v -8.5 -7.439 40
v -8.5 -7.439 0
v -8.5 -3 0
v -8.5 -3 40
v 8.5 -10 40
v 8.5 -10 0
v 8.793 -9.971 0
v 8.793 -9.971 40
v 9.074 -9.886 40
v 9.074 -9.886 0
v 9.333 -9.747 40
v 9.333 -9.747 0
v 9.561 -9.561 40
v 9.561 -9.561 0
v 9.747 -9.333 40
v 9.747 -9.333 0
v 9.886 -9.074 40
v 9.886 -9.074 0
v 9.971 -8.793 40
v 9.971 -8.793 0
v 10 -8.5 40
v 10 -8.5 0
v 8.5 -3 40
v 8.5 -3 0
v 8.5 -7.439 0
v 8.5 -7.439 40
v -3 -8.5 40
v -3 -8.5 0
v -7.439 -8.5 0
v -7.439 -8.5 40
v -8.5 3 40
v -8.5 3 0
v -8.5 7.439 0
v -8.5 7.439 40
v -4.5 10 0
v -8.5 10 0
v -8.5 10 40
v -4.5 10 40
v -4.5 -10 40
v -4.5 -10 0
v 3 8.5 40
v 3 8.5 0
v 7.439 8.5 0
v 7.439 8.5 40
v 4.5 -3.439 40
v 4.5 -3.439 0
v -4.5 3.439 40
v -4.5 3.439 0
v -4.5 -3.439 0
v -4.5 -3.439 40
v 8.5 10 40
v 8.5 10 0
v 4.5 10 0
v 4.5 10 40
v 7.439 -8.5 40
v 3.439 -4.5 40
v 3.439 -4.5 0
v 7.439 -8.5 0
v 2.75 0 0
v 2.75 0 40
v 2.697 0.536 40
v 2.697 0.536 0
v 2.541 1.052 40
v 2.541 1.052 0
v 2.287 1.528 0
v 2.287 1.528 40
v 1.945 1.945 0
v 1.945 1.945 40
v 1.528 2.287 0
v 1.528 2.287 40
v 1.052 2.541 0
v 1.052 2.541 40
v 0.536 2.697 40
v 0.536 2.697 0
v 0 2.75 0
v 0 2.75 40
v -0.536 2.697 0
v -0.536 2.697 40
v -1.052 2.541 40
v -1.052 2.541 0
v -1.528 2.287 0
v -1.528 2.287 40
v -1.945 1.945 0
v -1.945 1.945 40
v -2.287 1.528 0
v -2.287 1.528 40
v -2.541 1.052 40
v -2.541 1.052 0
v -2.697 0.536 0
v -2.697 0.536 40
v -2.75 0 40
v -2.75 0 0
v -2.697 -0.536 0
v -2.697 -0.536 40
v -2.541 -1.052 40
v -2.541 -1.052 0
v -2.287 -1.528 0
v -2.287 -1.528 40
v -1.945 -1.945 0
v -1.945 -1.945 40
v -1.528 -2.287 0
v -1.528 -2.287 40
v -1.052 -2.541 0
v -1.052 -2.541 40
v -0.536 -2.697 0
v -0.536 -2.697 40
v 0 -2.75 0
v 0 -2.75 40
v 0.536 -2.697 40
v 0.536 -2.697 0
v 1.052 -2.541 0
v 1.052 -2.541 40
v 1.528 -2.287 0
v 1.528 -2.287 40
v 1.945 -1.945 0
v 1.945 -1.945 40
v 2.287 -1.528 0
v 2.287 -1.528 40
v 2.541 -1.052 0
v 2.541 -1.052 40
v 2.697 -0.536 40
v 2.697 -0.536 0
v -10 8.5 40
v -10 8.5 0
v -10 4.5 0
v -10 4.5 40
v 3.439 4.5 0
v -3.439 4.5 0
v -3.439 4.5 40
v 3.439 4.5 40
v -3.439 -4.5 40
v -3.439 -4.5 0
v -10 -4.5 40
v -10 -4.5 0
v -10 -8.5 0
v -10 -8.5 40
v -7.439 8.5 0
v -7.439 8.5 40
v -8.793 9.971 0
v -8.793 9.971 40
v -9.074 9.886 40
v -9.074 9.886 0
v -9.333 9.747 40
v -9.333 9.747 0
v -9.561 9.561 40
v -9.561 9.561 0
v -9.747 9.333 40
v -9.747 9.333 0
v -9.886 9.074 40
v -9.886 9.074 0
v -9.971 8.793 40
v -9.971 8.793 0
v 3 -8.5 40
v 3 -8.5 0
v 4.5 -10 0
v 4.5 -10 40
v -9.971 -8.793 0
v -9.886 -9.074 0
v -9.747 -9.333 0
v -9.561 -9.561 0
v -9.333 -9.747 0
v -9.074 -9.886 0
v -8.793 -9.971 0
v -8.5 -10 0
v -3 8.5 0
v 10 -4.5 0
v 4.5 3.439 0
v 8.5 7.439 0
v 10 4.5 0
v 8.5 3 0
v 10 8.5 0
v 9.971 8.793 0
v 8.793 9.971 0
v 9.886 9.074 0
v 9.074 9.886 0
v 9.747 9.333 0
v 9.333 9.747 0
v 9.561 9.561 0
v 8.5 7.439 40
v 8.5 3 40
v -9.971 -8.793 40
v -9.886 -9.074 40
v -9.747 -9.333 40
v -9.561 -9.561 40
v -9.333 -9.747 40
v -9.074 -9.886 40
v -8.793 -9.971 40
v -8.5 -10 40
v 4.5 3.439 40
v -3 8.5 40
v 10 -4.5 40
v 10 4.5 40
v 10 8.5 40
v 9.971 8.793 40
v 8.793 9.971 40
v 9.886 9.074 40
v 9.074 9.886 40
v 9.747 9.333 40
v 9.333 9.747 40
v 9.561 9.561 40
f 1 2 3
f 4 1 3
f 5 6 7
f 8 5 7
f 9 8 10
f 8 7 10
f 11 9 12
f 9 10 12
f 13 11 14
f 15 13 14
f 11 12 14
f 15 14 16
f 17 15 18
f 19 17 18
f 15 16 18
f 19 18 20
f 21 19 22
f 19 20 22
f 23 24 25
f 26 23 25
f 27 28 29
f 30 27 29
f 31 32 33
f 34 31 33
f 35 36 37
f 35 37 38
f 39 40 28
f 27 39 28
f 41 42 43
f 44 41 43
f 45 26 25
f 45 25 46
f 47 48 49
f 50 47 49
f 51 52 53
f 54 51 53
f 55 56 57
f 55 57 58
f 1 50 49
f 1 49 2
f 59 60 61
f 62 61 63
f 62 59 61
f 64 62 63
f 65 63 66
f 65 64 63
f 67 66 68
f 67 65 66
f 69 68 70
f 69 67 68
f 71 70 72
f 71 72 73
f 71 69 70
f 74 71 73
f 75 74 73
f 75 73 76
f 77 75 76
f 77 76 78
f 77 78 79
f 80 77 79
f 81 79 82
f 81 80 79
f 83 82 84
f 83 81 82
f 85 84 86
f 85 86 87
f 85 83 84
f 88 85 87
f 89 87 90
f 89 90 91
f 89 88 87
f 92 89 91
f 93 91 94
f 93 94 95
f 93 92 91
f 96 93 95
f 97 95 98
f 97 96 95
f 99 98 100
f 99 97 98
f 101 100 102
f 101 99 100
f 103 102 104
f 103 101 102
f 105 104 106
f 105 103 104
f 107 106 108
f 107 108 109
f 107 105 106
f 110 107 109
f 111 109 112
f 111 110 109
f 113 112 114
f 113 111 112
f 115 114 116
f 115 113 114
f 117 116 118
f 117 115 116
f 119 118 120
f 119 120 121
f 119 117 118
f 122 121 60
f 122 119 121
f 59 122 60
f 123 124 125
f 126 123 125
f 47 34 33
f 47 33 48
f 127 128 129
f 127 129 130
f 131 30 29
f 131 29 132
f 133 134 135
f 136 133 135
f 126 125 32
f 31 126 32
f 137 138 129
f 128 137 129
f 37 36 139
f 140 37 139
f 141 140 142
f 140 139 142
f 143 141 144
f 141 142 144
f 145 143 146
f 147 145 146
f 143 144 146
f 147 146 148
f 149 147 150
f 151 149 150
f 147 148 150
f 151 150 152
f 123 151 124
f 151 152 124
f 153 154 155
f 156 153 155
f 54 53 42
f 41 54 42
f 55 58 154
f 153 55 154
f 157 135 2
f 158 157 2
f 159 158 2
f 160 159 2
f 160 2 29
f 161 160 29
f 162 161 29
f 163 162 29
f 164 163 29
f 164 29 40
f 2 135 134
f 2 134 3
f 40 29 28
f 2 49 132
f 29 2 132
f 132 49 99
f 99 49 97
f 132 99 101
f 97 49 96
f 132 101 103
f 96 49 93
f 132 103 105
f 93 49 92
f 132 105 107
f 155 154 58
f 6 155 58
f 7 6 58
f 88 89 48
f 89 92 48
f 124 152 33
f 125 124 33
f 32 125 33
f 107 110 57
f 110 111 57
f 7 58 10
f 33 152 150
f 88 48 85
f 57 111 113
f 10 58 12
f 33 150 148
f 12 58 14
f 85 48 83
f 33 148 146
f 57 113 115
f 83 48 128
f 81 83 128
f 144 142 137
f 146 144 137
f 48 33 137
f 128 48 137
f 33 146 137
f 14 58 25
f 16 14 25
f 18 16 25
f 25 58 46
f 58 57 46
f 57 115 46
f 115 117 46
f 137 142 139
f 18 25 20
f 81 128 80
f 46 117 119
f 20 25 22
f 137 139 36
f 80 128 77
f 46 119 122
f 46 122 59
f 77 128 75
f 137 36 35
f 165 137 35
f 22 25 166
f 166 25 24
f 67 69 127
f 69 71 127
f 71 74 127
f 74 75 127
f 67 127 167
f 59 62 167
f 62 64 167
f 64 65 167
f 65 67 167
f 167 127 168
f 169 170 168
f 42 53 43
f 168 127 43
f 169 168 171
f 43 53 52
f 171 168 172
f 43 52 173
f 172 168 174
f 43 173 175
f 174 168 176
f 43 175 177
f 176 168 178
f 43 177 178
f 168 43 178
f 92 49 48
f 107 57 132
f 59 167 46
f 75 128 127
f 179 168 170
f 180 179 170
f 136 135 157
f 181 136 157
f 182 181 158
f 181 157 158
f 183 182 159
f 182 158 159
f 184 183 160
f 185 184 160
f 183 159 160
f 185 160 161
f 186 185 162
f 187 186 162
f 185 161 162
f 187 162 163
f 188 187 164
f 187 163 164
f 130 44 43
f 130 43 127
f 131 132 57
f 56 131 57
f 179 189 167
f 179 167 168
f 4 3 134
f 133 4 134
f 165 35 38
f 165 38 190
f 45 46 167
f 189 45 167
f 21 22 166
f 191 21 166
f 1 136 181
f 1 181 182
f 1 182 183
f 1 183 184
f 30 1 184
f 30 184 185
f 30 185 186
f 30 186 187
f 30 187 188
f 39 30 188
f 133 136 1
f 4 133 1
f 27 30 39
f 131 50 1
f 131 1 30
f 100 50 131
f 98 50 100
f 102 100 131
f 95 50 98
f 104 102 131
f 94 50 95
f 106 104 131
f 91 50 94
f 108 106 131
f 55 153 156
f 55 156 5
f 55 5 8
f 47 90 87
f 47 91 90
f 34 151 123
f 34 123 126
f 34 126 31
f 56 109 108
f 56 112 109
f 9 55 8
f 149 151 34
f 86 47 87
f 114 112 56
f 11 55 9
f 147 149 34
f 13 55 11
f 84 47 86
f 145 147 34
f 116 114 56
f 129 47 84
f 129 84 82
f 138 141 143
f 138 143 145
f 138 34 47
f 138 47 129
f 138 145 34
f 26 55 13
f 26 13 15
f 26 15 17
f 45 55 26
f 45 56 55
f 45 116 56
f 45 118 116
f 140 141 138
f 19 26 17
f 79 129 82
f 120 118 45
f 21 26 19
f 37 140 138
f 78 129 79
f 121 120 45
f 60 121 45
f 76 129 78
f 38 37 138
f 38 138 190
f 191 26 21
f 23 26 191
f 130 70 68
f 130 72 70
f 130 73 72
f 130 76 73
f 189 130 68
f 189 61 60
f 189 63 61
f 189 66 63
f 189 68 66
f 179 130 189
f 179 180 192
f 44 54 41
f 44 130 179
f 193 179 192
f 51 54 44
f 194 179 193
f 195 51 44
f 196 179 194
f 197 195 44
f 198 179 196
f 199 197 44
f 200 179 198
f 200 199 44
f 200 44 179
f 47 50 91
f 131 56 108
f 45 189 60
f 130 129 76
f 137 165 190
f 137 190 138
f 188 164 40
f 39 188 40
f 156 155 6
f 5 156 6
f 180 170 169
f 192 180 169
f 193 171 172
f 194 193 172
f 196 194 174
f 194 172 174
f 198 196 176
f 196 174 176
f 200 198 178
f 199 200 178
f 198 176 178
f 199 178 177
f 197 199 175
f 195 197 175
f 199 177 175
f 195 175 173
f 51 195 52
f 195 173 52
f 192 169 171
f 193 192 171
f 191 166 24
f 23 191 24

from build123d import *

# Parameters (mm, degrees)
SKETCH_R  = 2.75
PAD_DEPTH = 40


with BuildPart() as part:
    # Sketch → Pad (new body)
    with BuildSketch(Plane.XY):
        with BuildLine():
            ThreePointArc((-8.5, 10), (-9.56066, 9.56066), (-10, 8.5))
            Line((-10, 8.5), (-10, 4.5))
            Line((-10, 4.5), (-8.5, 3))
            Line((-8.5, 3), (-8.5, 7.43934))
            Line((-8.5, 7.43934), (-4.5, 3.43934))
            Line((-4.5, 3.43934), (-4.5, -3.43934))
            Line((-4.5, -3.43934), (-8.5, -7.43934))
            Line((-8.5, -7.43934), (-8.5, -3))
            Line((-8.5, -3), (-10, -4.5))
            Line((-10, -4.5), (-10, -8.5))
            ThreePointArc((-10, -8.5), (-9.56066, -9.56066), (-8.5, -10))
            Line((-8.5, -10), (-4.5, -10))
            Line((-4.5, -10), (-3, -8.5))
            Line((-3, -8.5), (-7.43934, -8.5))
            Line((-7.43934, -8.5), (-3.43934, -4.5))
            Line((-3.43934, -4.5), (3.43934, -4.5))
            Line((3.43934, -4.5), (7.43934, -8.5))
            Line((7.43934, -8.5), (3, -8.5))
            Line((3, -8.5), (4.5, -10))
            Line((4.5, -10), (8.5, -10))
            ThreePointArc((8.5, -10), (9.56066, -9.56066), (10, -8.5))
            Line((10, -8.5), (10, -4.5))
            Line((10, -4.5), (8.5, -3))
            Line((8.5, -3), (8.5, -7.43934))
            Line((8.5, -7.43934), (4.5, -3.43934))
            Line((4.5, -3.43934), (4.5, 3.43934))
            Line((4.5, 3.43934), (8.5, 7.43934))
            Line((8.5, 7.43934), (8.5, 3))
            Line((8.5, 3), (10, 4.5))
            Line((10, 4.5), (10, 8.5))
            ThreePointArc((10, 8.5), (9.56066, 9.56066), (8.5, 10))
            Line((8.5, 10), (4.5, 10))
            Line((4.5, 10), (3, 8.5))
            Line((3, 8.5), (7.43934, 8.5))
            Line((7.43934, 8.5), (3.43934, 4.5))
            Line((-3.43934, 4.5), (3.43934, 4.5))
            Line((-7.43934, 8.5), (-3.43934, 4.5))
            Line((-3, 8.5), (-7.43934, 8.5))
            Line((-4.5, 10), (-3, 8.5))
            Line((-8.5, 10), (-4.5, 10))
        make_face()
        Circle(SKETCH_R, mode=Mode.SUBTRACT)
    extrude(amount=PAD_DEPTH)


solid = part.part
